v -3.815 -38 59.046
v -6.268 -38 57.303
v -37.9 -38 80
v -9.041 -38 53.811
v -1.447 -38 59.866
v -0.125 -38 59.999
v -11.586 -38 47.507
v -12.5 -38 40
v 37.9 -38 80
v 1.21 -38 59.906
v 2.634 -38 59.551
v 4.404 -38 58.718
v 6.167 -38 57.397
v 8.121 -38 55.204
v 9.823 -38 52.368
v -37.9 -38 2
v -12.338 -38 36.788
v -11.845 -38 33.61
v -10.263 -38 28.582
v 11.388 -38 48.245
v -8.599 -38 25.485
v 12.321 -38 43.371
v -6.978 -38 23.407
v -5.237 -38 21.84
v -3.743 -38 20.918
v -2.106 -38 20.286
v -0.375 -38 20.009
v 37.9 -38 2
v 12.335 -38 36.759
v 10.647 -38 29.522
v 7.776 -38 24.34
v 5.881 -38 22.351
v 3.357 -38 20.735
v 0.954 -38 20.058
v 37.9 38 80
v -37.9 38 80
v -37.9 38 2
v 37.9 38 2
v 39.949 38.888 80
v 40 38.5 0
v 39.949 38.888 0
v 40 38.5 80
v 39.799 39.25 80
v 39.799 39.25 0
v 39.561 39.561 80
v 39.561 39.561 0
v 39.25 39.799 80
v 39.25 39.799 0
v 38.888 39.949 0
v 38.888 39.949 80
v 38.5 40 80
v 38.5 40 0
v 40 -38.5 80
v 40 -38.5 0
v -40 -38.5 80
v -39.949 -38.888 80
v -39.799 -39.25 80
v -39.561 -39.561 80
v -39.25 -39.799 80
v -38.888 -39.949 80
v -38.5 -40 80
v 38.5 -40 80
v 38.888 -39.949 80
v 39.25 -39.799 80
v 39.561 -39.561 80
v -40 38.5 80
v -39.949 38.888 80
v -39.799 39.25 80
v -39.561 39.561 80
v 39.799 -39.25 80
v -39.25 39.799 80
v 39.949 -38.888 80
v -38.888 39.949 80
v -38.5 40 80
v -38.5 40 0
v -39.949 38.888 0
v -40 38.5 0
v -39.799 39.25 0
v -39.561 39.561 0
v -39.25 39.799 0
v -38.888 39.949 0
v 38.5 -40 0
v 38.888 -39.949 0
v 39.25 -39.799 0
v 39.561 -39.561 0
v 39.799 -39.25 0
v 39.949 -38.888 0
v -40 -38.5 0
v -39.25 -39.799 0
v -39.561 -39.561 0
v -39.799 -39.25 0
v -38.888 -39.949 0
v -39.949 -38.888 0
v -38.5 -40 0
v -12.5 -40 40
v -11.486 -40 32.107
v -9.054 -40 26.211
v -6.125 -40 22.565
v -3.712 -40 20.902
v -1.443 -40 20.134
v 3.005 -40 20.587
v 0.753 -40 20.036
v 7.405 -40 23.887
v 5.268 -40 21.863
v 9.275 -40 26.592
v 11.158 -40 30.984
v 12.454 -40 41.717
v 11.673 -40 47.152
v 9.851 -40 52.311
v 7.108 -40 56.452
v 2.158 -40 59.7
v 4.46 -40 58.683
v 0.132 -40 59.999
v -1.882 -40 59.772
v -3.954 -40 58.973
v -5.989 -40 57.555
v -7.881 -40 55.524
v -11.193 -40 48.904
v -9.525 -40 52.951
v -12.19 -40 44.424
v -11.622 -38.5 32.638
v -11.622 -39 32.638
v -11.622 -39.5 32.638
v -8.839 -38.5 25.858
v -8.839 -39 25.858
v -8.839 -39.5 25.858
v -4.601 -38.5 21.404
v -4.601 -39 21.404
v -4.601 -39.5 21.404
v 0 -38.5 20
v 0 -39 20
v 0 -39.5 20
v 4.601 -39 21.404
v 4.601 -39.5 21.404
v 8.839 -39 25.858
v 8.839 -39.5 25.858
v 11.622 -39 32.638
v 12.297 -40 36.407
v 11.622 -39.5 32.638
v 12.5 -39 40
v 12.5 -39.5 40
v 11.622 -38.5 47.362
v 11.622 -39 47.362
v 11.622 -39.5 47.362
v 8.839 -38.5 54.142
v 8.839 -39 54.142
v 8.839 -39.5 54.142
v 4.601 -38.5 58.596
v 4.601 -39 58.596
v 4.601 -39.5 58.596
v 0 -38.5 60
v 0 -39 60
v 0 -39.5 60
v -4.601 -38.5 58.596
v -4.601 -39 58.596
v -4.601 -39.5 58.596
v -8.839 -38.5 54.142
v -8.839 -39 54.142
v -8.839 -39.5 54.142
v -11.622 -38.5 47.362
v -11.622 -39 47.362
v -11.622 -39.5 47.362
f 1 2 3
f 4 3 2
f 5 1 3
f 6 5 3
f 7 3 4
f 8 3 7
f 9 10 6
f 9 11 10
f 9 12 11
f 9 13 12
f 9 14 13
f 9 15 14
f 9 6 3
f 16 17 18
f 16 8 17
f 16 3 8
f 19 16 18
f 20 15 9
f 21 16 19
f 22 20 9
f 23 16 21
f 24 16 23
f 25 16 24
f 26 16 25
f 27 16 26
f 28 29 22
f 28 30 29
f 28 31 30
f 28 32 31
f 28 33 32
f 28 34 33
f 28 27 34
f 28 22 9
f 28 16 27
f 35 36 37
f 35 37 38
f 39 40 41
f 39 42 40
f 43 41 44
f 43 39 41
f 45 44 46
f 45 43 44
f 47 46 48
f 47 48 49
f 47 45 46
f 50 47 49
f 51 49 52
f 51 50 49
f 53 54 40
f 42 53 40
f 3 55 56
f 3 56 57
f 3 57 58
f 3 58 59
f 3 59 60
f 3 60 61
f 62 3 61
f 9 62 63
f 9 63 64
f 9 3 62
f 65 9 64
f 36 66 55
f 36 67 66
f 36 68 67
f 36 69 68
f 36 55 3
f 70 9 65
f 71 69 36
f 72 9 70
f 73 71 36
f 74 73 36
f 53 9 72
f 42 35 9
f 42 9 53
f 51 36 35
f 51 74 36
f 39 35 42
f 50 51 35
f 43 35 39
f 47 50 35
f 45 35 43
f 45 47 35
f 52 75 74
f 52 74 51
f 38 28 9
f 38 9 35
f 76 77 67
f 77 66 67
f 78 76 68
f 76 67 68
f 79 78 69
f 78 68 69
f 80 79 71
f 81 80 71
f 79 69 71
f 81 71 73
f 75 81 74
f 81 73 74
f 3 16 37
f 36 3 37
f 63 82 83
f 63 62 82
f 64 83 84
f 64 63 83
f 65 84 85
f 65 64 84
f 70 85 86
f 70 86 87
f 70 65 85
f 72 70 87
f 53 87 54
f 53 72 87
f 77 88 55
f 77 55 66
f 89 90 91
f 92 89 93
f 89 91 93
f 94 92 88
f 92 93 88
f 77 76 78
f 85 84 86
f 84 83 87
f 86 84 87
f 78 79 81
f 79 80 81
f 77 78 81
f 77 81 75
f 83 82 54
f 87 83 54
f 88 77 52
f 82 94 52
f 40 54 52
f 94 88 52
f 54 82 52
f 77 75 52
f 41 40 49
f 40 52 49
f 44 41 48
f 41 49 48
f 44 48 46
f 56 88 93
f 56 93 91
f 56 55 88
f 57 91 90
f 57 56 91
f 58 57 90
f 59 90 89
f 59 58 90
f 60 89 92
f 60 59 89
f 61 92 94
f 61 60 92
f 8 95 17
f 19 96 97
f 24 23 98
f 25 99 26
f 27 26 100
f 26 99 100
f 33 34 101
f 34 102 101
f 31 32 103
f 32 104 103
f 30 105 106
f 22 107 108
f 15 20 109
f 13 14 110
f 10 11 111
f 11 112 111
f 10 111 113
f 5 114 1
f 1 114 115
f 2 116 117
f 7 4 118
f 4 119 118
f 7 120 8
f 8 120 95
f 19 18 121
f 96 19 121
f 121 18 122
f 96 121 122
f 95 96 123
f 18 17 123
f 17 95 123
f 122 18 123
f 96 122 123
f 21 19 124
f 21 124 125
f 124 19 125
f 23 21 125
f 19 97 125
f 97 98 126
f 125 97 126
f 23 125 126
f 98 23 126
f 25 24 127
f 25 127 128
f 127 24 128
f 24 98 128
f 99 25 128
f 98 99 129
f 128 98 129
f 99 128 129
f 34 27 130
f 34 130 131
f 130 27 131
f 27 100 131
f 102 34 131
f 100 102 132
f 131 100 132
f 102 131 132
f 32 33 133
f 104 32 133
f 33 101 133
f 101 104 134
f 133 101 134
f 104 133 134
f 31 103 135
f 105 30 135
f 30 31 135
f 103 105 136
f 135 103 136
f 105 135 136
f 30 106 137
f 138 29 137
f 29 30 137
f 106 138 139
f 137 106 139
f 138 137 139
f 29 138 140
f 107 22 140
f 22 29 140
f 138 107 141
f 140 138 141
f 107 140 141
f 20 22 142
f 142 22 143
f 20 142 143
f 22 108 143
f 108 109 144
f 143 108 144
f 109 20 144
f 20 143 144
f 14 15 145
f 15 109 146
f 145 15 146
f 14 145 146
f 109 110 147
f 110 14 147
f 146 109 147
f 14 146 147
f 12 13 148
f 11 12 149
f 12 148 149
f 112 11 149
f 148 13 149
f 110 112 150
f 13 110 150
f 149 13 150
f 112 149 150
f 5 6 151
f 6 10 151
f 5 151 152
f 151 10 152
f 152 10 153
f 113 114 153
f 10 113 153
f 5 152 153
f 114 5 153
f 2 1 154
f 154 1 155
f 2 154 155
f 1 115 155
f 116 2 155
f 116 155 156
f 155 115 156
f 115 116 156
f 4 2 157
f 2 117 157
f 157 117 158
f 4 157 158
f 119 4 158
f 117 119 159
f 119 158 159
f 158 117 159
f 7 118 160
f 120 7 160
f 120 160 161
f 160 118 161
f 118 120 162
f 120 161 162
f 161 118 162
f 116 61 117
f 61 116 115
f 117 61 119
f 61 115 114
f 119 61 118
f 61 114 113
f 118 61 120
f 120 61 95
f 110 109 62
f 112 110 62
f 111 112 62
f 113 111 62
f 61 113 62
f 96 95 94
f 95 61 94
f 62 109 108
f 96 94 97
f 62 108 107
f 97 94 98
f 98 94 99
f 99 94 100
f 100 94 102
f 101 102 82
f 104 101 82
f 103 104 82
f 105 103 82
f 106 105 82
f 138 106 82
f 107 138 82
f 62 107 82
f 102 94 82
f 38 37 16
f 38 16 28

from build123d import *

# Parameters (mm, degrees)
F0_W     = 80
F0_H     = 80
F0_W_2   = 75.8
F0_H_2   = 76
F1_DEPTH = 80
F2_DEPTH = 2
F4_DEPTH = 25
F5_R     = 1.5


with BuildPart() as f1:
    # F0 (on Top) → F1 (new body)
    with BuildSketch(Plane.XY):
        Rectangle(F0_W, F0_H)
        Rectangle(F0_W_2, F0_H_2, mode=Mode.SUBTRACT)
    extrude(amount=F1_DEPTH)

    # F0 (on Top) → F2 (join)
    with BuildSketch(Plane.XY):
        Rectangle(F0_W_2, F0_H_2)
    extrude(amount=F2_DEPTH)

    # F3 (on face) → F4 (cut)
    with BuildSketch(Plane.XZ.offset(40)):
        with BuildLine():
            Line((0, 40), (0, 60))
            add(Edge.make_bspline(
                [(0, 60), (-12.5, 60), (-12.5, 40)],
                knots=[0, 0, 0, 1.5707963268, 1.5707963268, 1.5707963268], degree=2, weights=[1, 0.7071067812, 1]))
            Line((-12.5, 40), (0, 40))
        make_face()
        with BuildLine():
            add(Edge.make_bspline(
                [(12.5, 40), (12.5, 60), (0, 60)],
                knots=[4.7123889804, 4.7123889804, 4.7123889804, 6.2831853072, 6.2831853072, 6.2831853072], degree=2, weights=[1, 0.7071067812, 1]))
            Line((0, 60), (0, 40))
            Line((0, 40), (12.5, 40))
        make_face()
        with BuildLine():
            Line((12.5, 40), (0, 40))
            Line((0, 40), (0, 20))
            add(Edge.make_bspline(
                [(0, 20), (12.5, 20), (12.5, 40)],
                knots=[3.1415926536, 3.1415926536, 3.1415926536, 4.7123889804, 4.7123889804, 4.7123889804], degree=2, weights=[1, 0.7071067812, 1]))
        make_face()
        with BuildLine():
            Line((0, 20), (0, 40))
            Line((0, 40), (-12.5, 40))
            add(Edge.make_bspline(
                [(-12.5, 40), (-12.5, 20), (0, 20)],
                knots=[1.5707963268, 1.5707963268, 1.5707963268, 3.1415926536, 3.1415926536, 3.1415926536], degree=2, weights=[1, 0.7071067812, 1]))
        make_face()
    extrude(amount=-F4_DEPTH, mode=Mode.SUBTRACT)

    # F5
    f5_edges = [f1.edges().sort_by_distance(p)[0] for p in [
        (-40, -40, 40),
        (40, 40, 40),
        (-40, 40, 40),
        (40, -40, 40),
    ]]
    fillet(f5_edges, radius=F5_R)


solid = f1.part
